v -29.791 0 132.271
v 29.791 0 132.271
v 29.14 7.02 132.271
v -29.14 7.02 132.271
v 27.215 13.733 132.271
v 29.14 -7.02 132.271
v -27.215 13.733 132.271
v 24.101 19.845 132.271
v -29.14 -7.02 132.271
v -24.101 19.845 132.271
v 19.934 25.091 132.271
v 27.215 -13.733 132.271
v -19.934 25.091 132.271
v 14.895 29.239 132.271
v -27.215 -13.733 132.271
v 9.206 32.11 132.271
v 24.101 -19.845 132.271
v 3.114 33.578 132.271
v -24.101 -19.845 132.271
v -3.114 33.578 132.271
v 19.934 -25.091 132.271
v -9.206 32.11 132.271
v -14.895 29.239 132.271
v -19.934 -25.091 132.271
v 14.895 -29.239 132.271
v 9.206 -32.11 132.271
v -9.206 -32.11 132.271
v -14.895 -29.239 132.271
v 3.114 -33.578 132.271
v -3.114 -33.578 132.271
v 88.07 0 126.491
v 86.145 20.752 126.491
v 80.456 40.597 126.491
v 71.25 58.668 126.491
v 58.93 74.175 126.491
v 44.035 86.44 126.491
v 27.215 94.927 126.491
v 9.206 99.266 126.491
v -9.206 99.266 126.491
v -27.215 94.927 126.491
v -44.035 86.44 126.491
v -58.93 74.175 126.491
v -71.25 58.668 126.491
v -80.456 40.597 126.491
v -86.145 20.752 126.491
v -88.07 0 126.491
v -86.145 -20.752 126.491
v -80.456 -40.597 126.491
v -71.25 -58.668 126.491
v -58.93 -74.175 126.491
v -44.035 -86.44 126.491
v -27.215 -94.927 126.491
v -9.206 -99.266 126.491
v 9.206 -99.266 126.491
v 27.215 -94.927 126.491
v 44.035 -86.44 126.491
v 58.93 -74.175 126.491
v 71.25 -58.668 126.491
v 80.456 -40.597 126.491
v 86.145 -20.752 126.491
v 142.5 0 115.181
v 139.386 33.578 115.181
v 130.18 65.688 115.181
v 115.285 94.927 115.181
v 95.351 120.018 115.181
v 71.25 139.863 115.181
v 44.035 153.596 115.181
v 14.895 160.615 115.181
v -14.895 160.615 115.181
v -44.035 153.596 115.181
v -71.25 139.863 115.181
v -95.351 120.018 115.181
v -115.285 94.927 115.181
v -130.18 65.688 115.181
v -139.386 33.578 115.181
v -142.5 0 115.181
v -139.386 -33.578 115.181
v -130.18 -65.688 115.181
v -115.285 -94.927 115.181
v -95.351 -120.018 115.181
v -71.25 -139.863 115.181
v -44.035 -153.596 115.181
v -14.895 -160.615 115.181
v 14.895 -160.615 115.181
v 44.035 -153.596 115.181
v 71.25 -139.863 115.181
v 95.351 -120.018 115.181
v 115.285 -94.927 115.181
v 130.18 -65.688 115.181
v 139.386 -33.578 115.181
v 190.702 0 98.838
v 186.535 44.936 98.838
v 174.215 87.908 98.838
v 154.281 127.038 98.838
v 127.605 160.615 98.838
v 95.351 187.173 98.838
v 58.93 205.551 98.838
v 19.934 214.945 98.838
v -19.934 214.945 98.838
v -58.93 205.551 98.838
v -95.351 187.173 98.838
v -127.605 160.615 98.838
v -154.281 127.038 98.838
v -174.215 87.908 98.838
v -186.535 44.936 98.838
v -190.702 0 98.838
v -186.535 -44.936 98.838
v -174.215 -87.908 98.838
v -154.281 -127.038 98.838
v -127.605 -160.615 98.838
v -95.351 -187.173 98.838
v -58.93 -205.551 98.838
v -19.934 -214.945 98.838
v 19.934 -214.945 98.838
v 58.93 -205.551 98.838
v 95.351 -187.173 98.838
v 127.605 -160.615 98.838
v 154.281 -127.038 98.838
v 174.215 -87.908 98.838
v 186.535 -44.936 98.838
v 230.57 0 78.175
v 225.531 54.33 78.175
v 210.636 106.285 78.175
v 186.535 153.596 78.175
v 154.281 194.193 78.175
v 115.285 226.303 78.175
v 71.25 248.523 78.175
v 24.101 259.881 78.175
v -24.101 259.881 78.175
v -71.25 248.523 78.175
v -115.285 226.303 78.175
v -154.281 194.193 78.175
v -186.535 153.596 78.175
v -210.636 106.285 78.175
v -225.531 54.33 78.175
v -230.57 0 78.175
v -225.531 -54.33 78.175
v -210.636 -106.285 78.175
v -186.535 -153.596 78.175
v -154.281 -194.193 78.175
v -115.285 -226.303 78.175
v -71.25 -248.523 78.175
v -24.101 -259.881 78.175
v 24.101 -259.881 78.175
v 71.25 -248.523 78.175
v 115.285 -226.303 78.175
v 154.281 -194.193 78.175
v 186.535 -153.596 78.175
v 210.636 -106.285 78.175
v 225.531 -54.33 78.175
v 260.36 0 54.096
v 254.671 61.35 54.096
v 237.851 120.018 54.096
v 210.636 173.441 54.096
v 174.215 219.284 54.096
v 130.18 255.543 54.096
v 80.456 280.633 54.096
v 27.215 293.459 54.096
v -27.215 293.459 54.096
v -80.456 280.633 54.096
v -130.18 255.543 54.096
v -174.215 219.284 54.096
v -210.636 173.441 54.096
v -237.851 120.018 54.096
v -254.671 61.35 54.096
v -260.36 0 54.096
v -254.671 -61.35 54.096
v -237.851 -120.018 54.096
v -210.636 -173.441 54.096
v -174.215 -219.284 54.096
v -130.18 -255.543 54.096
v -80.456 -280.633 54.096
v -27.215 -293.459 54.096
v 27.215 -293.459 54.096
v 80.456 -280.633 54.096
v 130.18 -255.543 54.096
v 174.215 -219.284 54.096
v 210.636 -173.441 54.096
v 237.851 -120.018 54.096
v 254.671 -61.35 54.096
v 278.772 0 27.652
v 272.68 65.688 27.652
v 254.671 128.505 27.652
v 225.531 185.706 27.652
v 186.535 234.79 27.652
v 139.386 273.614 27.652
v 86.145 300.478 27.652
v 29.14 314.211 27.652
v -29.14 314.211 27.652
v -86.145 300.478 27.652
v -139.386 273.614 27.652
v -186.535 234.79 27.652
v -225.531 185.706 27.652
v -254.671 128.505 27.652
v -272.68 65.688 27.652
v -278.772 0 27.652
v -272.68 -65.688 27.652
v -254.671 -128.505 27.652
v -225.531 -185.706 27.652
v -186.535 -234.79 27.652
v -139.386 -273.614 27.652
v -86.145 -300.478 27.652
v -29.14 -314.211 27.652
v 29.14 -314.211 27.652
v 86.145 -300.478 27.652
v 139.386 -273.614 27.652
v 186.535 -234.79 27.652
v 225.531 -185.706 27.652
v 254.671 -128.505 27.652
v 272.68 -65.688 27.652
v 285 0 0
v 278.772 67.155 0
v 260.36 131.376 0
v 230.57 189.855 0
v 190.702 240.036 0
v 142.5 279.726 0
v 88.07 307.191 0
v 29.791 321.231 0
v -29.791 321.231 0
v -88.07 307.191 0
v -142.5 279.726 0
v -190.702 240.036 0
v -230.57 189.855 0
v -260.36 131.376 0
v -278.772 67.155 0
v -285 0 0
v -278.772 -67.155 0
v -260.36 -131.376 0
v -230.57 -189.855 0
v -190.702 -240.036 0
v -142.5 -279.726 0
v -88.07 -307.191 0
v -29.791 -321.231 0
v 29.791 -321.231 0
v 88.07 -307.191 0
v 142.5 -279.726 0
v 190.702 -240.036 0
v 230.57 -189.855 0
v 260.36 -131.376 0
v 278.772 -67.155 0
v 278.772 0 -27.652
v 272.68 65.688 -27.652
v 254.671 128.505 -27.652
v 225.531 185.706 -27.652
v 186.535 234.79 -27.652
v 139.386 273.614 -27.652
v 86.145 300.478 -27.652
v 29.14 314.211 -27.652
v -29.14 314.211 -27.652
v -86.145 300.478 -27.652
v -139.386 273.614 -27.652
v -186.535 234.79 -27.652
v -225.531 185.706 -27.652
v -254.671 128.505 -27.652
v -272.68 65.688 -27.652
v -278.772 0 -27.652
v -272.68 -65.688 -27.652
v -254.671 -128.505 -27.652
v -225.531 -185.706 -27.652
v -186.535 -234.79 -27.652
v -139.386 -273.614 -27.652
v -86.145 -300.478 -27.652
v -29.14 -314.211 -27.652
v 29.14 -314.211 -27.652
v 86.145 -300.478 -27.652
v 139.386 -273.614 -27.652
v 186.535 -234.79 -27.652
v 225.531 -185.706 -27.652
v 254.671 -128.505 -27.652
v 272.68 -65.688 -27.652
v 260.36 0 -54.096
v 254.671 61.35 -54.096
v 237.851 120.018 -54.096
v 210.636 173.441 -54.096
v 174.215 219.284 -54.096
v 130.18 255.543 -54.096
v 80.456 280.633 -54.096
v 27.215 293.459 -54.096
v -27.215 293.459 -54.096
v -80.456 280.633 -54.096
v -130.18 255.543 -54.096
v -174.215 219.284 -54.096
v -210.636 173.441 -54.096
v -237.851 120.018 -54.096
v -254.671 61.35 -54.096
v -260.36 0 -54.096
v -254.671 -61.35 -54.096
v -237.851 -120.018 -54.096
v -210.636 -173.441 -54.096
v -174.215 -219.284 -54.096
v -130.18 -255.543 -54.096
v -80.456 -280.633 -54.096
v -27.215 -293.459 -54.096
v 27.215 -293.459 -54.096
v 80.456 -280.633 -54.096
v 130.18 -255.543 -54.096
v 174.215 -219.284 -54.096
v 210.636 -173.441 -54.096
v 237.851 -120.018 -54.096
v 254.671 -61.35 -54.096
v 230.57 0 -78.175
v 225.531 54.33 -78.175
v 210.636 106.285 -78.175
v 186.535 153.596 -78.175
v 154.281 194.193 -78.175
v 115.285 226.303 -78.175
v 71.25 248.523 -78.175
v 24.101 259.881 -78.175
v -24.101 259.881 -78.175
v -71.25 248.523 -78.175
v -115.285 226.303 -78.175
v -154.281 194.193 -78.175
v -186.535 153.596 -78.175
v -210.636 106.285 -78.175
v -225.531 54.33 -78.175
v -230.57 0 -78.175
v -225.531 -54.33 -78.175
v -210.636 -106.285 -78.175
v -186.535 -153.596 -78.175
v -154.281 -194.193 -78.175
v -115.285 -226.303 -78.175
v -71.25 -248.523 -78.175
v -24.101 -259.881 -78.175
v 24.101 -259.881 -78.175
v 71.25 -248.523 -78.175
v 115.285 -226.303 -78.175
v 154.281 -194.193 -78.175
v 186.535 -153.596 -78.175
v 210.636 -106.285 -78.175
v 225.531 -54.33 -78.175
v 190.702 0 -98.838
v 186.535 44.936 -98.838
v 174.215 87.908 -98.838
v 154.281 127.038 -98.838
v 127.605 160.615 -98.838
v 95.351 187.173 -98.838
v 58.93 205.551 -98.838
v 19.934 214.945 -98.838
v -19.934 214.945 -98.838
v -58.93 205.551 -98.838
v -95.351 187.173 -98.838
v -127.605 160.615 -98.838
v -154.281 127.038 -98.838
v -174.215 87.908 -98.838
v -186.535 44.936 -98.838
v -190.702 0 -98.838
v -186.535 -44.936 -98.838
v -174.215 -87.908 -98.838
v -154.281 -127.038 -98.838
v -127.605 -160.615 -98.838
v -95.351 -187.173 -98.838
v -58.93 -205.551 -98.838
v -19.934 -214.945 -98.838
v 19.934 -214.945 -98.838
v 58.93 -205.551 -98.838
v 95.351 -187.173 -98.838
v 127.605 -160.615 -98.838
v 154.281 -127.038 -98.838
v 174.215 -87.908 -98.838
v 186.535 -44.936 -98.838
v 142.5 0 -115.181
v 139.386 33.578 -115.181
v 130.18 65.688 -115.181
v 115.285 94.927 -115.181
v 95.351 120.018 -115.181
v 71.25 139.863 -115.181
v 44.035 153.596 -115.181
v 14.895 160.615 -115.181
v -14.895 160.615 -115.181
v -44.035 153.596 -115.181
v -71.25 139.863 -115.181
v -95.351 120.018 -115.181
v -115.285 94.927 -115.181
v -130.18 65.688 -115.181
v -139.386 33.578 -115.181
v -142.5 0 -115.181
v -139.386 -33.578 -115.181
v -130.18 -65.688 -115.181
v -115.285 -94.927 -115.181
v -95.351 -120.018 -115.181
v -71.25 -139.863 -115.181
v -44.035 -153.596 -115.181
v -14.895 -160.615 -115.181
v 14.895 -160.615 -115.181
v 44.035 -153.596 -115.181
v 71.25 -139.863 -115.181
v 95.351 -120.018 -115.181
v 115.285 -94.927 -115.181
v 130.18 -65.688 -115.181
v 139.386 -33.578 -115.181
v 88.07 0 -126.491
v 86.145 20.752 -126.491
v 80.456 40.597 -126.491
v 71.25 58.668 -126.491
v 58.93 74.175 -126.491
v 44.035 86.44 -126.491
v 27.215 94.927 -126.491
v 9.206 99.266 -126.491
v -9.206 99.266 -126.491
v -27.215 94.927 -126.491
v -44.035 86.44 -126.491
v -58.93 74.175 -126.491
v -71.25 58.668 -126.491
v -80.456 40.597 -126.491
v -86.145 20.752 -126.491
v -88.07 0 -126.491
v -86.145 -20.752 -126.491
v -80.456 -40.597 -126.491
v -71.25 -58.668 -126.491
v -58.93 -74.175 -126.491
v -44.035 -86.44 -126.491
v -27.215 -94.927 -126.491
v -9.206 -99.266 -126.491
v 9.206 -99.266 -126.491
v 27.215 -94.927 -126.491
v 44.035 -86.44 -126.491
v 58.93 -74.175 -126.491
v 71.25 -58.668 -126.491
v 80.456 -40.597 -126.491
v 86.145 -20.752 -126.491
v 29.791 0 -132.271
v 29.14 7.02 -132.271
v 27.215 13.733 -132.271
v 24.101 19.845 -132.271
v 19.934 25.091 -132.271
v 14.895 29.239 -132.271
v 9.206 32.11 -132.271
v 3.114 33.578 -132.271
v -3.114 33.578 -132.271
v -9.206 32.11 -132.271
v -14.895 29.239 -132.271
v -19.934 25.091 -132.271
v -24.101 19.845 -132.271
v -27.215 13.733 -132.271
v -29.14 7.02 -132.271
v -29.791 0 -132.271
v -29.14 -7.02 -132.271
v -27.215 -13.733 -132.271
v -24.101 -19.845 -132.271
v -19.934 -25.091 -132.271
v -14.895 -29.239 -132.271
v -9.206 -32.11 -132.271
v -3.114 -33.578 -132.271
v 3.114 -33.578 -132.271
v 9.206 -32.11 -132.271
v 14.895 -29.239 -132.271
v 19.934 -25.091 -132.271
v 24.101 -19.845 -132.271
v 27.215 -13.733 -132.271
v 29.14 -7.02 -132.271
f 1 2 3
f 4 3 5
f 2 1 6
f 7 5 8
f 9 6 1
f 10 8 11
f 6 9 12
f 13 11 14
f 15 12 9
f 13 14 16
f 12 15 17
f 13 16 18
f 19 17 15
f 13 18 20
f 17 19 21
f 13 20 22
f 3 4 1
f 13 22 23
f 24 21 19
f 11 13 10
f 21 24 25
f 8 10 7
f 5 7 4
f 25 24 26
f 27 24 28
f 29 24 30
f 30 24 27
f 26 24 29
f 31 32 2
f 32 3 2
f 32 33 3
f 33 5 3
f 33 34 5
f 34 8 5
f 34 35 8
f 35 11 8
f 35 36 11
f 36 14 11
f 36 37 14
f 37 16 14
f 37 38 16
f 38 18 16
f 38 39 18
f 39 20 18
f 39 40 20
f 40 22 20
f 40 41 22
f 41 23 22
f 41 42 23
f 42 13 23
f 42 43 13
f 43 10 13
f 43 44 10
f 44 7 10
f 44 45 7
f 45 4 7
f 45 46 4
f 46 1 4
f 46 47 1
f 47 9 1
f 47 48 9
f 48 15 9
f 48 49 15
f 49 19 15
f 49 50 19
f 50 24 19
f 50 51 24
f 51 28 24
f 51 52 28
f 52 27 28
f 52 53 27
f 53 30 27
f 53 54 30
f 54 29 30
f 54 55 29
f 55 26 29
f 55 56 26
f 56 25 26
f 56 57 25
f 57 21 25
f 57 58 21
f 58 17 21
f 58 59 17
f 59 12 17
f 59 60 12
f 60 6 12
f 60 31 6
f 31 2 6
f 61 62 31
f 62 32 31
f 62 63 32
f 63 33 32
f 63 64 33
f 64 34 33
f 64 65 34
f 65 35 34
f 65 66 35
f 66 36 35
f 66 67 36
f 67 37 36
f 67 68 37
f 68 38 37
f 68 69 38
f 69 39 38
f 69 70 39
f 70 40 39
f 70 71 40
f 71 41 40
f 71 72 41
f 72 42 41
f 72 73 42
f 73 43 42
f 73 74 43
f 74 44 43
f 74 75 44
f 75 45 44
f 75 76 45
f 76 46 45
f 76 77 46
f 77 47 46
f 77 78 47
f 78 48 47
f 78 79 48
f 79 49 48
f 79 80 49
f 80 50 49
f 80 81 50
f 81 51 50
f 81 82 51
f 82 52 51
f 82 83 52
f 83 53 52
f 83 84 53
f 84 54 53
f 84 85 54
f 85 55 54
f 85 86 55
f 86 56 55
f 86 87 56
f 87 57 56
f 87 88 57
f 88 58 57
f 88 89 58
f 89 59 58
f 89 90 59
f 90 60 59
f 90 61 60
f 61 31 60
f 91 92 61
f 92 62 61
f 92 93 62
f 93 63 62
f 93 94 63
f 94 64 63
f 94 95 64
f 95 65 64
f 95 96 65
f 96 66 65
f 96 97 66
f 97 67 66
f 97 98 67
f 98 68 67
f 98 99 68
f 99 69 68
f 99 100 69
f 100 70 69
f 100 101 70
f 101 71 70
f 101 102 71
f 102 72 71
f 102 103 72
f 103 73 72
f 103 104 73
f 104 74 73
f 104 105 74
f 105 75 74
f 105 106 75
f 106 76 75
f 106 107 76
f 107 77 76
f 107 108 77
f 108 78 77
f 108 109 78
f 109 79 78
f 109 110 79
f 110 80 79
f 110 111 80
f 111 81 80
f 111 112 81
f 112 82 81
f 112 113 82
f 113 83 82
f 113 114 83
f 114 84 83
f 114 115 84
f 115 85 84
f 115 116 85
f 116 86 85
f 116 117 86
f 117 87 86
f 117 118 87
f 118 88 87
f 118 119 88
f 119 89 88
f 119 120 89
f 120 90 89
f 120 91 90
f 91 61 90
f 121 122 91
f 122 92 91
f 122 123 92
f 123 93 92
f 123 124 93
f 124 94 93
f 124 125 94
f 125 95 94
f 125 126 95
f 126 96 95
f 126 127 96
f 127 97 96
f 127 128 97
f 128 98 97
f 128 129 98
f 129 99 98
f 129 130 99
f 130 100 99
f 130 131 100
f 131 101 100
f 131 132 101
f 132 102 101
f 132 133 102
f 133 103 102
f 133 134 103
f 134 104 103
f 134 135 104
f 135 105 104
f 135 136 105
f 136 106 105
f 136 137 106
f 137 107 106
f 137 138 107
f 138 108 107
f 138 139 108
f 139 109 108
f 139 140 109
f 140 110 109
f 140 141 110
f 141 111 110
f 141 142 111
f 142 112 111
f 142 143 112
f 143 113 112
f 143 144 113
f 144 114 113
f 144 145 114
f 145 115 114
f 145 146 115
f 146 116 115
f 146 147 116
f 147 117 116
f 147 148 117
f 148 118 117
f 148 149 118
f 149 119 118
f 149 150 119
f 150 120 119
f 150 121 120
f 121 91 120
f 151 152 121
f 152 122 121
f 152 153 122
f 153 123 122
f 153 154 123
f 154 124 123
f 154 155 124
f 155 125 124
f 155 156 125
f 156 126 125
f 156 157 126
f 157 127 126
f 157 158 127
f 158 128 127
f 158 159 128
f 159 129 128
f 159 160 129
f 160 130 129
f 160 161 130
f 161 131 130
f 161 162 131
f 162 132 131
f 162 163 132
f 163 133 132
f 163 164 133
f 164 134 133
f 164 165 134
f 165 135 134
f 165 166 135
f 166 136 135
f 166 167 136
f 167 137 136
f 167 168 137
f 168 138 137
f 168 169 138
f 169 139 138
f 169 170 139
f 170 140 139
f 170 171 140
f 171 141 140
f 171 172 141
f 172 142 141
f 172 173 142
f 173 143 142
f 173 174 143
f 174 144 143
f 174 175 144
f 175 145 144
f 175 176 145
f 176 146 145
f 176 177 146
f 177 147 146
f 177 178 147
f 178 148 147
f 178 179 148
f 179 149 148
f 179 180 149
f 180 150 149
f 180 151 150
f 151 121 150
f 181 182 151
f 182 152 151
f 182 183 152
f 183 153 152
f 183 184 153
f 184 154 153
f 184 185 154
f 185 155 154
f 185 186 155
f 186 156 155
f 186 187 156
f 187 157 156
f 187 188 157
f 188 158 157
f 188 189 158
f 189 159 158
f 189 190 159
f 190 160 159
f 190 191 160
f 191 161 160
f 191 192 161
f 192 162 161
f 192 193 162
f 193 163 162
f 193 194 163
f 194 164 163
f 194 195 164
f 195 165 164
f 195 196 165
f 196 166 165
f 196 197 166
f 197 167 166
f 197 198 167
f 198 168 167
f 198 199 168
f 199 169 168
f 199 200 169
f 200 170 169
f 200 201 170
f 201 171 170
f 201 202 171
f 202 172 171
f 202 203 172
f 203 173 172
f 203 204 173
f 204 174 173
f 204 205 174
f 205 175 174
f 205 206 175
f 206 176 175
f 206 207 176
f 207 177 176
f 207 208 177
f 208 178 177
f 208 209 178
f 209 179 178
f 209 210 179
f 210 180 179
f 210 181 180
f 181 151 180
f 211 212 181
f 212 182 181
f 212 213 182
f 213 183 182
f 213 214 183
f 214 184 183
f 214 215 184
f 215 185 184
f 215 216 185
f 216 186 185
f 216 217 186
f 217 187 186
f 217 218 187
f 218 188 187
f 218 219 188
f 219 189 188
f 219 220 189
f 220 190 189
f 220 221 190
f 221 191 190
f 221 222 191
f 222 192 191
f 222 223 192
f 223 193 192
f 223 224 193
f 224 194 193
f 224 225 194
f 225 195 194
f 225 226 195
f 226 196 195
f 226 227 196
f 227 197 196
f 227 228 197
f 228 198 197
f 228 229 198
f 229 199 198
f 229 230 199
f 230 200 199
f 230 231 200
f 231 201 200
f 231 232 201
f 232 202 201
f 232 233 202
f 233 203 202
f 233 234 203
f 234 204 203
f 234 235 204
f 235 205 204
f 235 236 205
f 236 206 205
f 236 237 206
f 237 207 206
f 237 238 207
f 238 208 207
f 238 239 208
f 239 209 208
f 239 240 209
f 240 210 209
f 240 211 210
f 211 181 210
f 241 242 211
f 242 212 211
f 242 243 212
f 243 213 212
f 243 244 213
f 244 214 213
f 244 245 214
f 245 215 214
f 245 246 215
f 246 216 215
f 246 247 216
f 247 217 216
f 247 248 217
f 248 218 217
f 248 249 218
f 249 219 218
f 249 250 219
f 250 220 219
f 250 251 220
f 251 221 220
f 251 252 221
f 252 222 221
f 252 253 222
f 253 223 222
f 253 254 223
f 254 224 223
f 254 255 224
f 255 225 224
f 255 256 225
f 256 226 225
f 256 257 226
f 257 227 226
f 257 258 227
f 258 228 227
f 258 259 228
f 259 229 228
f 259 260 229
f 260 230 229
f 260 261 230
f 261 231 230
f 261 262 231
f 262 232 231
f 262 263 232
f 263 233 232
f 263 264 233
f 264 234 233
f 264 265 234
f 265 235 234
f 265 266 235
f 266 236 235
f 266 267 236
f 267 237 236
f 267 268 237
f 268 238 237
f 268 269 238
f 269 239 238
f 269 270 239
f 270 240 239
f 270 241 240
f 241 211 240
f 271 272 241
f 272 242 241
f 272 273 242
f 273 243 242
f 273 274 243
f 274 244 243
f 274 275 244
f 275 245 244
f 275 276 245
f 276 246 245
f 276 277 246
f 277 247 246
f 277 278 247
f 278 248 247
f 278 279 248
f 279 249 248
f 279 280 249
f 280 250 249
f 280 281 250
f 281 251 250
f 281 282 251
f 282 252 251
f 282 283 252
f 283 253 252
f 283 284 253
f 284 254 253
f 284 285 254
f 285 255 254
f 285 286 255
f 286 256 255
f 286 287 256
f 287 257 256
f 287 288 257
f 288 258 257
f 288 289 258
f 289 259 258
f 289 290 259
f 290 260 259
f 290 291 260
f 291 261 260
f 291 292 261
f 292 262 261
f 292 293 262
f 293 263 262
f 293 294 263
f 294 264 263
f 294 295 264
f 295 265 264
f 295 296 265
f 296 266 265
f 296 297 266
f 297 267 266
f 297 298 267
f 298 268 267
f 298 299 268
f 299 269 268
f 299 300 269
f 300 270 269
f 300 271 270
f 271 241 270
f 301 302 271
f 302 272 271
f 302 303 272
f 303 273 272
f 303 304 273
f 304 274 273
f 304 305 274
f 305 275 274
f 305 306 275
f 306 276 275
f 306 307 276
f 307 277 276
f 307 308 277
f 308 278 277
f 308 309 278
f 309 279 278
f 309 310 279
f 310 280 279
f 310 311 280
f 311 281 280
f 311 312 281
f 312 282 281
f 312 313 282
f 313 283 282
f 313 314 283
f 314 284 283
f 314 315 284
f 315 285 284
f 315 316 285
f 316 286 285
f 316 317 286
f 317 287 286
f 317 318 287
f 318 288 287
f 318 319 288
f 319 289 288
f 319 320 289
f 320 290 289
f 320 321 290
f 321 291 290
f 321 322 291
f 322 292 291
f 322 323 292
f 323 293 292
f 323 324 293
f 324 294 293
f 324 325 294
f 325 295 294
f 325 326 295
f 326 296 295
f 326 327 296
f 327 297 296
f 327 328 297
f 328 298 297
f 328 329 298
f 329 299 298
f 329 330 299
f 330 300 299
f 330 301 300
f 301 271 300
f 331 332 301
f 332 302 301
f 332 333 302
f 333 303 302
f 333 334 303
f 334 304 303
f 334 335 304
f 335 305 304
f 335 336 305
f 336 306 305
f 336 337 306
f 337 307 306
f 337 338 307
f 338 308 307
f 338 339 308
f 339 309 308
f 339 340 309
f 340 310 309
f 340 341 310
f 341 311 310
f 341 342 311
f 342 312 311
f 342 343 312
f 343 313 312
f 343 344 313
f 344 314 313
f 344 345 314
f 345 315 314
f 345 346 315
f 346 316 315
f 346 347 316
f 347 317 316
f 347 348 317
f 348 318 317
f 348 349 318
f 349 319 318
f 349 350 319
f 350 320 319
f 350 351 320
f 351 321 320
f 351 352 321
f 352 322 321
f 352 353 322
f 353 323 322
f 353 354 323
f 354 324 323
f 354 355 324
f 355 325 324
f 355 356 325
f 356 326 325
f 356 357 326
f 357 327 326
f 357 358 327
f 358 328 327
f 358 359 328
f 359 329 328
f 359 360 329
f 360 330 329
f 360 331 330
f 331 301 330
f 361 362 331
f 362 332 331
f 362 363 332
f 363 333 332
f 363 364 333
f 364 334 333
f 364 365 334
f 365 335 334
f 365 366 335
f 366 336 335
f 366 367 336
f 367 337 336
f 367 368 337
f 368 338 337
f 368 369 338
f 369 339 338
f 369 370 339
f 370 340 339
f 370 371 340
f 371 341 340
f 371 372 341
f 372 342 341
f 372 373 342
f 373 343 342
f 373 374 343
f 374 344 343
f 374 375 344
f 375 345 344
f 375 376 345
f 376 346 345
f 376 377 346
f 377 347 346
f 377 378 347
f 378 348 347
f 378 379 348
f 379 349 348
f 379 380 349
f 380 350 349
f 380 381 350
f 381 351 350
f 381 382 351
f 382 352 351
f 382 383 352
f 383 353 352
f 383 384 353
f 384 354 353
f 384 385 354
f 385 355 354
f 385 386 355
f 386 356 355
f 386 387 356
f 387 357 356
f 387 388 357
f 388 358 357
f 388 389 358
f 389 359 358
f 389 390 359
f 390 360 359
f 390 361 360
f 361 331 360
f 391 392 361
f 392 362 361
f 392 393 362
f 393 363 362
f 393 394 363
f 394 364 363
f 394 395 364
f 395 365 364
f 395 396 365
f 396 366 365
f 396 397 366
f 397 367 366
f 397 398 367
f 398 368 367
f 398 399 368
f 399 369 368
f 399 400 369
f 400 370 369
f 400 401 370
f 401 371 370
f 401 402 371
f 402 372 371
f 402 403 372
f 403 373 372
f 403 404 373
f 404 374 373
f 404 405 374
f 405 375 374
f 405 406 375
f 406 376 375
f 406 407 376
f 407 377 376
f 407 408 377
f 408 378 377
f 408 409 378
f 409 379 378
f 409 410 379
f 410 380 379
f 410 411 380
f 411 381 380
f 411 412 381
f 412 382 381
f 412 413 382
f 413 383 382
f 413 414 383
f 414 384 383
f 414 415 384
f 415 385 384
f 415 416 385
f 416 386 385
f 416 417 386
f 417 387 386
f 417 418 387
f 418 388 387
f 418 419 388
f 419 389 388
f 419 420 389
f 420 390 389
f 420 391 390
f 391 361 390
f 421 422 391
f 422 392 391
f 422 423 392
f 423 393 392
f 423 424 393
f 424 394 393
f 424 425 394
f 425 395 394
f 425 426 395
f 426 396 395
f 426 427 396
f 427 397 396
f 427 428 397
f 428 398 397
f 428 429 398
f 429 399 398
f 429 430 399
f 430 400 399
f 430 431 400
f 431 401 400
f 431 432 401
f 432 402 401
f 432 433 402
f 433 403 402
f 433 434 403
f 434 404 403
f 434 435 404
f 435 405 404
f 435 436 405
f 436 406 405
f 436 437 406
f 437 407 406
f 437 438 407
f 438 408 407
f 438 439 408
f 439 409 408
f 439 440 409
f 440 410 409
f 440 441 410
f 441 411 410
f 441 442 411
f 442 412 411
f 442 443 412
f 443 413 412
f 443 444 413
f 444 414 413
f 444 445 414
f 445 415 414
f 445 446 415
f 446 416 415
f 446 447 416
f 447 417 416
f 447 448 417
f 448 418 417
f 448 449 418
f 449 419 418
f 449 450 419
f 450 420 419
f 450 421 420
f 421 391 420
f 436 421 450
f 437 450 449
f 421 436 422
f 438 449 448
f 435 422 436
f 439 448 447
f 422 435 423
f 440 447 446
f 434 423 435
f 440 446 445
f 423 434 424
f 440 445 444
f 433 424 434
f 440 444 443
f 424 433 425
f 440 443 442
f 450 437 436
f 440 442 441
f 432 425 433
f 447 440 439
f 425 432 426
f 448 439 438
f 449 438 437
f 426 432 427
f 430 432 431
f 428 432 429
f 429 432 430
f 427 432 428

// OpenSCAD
// Generated by SolidPython 1.0.1 on 2020-07-29 00:46:52


scale(v = [15, 17, 7]) {
	sphere(r = 19);
}
/***********************************************
*********      SolidPython code:      **********
************************************************
 
# import packages: SolidPython
from solid import *
from solid.utils import *
from itertools import chain, combinations, permutations


class Resize:

    def __init__(self, scad_file):
        self.scad_file = scad_file
        #self.scad_file = import_scad(scad_file)
        # cone/cylinder param:
        self.r1 = 0
        self.r2 = 0
        self.h = 0
        # rectangular prism param:
        self.w = 0
        self.l = 0
        # ellipse param:
        self.r = 0

    # import OpenScad code (file name corresponds to shape)


    # classify shape + parameters
    def assign(self, param1, param2, param3):
        if self.scad_file == 'cone.scad':
            self.r1 = param1
            self.r2 = param2
            self.h = param3
        elif self.scad_file == 'cylinder.scad':
            self.r1 = param1
            self.r2 = param2
            self.h = param3
        elif self.scad_file == 'rectangularPrism.scad':
            self.h = param1
            self.l = param2
            self.w = param3
        else:
            self.r = param1
            self.h = param2

    # resize parameters
    def iterate(self):
        x = range(3, 20, 2)
        i = 1
        if self.scad_file == 'cone.scad':
            tempList = list(permutations(x, 2))
            for temp in tempList:
                param1 = temp[0]
                param2 = temp[1]
                filepath = 'produced_scad_files/' + 'cone' + str(param1) + '_' + str(param2) + '_' + '.scad'
                scad_render_to_file(cylinder(h=param1, r1=param2, r2=0), filepath)

        elif self.scad_file == 'cylinder.scad':
            tempList = list(permutations(x, 3))
            for temp in tempList:
                param1 = temp[0]
                param2 = temp[1]
                filepath = 'produced_scad_files/' + 'cylinder' + str(param1) + '_' + str(param2) + '_' + '.scad'
                scad_render_to_file(cylinder(h=param1, r1=param2, r2=param2), filepath)

        elif self.scad_file == 'rectangularPrism.scad':
            tempList = list(permutations(x, 3))
            for temp in tempList:
                param1 = temp[0]
                param2 = temp[1]
                param3 = temp[2]
                filepath = 'produced_scad_files/' + 'rectangularPrism' + str(param1) + '_' + str(param2) + '_' + str(
                    param3) + '.scad'
                scad_render_to_file(cube(size=(param1, param2, param3)), filepath)

        elif self.scad_file == 'ellipse.scad':
            tempList = list(permutations(x, 4))
            for temp in tempList:
                param1 = temp[0]
                param2 = temp[1]
                param3 = temp[2]
                param4 = temp[3]
                filepath = 'produced_scad_files/' + 'ellipse' + str(param1) + '_' + str(param2) + '_' + str(param3) + '_' + str(param4) + '.scad'
                scad_render_to_file(scale([param1, param2, param3])(sphere(r=param4)), filepath)

    def render_to_scadfile(self):
        scad_render_to_file(scad, 'example.scad') 
 
************************************************/
